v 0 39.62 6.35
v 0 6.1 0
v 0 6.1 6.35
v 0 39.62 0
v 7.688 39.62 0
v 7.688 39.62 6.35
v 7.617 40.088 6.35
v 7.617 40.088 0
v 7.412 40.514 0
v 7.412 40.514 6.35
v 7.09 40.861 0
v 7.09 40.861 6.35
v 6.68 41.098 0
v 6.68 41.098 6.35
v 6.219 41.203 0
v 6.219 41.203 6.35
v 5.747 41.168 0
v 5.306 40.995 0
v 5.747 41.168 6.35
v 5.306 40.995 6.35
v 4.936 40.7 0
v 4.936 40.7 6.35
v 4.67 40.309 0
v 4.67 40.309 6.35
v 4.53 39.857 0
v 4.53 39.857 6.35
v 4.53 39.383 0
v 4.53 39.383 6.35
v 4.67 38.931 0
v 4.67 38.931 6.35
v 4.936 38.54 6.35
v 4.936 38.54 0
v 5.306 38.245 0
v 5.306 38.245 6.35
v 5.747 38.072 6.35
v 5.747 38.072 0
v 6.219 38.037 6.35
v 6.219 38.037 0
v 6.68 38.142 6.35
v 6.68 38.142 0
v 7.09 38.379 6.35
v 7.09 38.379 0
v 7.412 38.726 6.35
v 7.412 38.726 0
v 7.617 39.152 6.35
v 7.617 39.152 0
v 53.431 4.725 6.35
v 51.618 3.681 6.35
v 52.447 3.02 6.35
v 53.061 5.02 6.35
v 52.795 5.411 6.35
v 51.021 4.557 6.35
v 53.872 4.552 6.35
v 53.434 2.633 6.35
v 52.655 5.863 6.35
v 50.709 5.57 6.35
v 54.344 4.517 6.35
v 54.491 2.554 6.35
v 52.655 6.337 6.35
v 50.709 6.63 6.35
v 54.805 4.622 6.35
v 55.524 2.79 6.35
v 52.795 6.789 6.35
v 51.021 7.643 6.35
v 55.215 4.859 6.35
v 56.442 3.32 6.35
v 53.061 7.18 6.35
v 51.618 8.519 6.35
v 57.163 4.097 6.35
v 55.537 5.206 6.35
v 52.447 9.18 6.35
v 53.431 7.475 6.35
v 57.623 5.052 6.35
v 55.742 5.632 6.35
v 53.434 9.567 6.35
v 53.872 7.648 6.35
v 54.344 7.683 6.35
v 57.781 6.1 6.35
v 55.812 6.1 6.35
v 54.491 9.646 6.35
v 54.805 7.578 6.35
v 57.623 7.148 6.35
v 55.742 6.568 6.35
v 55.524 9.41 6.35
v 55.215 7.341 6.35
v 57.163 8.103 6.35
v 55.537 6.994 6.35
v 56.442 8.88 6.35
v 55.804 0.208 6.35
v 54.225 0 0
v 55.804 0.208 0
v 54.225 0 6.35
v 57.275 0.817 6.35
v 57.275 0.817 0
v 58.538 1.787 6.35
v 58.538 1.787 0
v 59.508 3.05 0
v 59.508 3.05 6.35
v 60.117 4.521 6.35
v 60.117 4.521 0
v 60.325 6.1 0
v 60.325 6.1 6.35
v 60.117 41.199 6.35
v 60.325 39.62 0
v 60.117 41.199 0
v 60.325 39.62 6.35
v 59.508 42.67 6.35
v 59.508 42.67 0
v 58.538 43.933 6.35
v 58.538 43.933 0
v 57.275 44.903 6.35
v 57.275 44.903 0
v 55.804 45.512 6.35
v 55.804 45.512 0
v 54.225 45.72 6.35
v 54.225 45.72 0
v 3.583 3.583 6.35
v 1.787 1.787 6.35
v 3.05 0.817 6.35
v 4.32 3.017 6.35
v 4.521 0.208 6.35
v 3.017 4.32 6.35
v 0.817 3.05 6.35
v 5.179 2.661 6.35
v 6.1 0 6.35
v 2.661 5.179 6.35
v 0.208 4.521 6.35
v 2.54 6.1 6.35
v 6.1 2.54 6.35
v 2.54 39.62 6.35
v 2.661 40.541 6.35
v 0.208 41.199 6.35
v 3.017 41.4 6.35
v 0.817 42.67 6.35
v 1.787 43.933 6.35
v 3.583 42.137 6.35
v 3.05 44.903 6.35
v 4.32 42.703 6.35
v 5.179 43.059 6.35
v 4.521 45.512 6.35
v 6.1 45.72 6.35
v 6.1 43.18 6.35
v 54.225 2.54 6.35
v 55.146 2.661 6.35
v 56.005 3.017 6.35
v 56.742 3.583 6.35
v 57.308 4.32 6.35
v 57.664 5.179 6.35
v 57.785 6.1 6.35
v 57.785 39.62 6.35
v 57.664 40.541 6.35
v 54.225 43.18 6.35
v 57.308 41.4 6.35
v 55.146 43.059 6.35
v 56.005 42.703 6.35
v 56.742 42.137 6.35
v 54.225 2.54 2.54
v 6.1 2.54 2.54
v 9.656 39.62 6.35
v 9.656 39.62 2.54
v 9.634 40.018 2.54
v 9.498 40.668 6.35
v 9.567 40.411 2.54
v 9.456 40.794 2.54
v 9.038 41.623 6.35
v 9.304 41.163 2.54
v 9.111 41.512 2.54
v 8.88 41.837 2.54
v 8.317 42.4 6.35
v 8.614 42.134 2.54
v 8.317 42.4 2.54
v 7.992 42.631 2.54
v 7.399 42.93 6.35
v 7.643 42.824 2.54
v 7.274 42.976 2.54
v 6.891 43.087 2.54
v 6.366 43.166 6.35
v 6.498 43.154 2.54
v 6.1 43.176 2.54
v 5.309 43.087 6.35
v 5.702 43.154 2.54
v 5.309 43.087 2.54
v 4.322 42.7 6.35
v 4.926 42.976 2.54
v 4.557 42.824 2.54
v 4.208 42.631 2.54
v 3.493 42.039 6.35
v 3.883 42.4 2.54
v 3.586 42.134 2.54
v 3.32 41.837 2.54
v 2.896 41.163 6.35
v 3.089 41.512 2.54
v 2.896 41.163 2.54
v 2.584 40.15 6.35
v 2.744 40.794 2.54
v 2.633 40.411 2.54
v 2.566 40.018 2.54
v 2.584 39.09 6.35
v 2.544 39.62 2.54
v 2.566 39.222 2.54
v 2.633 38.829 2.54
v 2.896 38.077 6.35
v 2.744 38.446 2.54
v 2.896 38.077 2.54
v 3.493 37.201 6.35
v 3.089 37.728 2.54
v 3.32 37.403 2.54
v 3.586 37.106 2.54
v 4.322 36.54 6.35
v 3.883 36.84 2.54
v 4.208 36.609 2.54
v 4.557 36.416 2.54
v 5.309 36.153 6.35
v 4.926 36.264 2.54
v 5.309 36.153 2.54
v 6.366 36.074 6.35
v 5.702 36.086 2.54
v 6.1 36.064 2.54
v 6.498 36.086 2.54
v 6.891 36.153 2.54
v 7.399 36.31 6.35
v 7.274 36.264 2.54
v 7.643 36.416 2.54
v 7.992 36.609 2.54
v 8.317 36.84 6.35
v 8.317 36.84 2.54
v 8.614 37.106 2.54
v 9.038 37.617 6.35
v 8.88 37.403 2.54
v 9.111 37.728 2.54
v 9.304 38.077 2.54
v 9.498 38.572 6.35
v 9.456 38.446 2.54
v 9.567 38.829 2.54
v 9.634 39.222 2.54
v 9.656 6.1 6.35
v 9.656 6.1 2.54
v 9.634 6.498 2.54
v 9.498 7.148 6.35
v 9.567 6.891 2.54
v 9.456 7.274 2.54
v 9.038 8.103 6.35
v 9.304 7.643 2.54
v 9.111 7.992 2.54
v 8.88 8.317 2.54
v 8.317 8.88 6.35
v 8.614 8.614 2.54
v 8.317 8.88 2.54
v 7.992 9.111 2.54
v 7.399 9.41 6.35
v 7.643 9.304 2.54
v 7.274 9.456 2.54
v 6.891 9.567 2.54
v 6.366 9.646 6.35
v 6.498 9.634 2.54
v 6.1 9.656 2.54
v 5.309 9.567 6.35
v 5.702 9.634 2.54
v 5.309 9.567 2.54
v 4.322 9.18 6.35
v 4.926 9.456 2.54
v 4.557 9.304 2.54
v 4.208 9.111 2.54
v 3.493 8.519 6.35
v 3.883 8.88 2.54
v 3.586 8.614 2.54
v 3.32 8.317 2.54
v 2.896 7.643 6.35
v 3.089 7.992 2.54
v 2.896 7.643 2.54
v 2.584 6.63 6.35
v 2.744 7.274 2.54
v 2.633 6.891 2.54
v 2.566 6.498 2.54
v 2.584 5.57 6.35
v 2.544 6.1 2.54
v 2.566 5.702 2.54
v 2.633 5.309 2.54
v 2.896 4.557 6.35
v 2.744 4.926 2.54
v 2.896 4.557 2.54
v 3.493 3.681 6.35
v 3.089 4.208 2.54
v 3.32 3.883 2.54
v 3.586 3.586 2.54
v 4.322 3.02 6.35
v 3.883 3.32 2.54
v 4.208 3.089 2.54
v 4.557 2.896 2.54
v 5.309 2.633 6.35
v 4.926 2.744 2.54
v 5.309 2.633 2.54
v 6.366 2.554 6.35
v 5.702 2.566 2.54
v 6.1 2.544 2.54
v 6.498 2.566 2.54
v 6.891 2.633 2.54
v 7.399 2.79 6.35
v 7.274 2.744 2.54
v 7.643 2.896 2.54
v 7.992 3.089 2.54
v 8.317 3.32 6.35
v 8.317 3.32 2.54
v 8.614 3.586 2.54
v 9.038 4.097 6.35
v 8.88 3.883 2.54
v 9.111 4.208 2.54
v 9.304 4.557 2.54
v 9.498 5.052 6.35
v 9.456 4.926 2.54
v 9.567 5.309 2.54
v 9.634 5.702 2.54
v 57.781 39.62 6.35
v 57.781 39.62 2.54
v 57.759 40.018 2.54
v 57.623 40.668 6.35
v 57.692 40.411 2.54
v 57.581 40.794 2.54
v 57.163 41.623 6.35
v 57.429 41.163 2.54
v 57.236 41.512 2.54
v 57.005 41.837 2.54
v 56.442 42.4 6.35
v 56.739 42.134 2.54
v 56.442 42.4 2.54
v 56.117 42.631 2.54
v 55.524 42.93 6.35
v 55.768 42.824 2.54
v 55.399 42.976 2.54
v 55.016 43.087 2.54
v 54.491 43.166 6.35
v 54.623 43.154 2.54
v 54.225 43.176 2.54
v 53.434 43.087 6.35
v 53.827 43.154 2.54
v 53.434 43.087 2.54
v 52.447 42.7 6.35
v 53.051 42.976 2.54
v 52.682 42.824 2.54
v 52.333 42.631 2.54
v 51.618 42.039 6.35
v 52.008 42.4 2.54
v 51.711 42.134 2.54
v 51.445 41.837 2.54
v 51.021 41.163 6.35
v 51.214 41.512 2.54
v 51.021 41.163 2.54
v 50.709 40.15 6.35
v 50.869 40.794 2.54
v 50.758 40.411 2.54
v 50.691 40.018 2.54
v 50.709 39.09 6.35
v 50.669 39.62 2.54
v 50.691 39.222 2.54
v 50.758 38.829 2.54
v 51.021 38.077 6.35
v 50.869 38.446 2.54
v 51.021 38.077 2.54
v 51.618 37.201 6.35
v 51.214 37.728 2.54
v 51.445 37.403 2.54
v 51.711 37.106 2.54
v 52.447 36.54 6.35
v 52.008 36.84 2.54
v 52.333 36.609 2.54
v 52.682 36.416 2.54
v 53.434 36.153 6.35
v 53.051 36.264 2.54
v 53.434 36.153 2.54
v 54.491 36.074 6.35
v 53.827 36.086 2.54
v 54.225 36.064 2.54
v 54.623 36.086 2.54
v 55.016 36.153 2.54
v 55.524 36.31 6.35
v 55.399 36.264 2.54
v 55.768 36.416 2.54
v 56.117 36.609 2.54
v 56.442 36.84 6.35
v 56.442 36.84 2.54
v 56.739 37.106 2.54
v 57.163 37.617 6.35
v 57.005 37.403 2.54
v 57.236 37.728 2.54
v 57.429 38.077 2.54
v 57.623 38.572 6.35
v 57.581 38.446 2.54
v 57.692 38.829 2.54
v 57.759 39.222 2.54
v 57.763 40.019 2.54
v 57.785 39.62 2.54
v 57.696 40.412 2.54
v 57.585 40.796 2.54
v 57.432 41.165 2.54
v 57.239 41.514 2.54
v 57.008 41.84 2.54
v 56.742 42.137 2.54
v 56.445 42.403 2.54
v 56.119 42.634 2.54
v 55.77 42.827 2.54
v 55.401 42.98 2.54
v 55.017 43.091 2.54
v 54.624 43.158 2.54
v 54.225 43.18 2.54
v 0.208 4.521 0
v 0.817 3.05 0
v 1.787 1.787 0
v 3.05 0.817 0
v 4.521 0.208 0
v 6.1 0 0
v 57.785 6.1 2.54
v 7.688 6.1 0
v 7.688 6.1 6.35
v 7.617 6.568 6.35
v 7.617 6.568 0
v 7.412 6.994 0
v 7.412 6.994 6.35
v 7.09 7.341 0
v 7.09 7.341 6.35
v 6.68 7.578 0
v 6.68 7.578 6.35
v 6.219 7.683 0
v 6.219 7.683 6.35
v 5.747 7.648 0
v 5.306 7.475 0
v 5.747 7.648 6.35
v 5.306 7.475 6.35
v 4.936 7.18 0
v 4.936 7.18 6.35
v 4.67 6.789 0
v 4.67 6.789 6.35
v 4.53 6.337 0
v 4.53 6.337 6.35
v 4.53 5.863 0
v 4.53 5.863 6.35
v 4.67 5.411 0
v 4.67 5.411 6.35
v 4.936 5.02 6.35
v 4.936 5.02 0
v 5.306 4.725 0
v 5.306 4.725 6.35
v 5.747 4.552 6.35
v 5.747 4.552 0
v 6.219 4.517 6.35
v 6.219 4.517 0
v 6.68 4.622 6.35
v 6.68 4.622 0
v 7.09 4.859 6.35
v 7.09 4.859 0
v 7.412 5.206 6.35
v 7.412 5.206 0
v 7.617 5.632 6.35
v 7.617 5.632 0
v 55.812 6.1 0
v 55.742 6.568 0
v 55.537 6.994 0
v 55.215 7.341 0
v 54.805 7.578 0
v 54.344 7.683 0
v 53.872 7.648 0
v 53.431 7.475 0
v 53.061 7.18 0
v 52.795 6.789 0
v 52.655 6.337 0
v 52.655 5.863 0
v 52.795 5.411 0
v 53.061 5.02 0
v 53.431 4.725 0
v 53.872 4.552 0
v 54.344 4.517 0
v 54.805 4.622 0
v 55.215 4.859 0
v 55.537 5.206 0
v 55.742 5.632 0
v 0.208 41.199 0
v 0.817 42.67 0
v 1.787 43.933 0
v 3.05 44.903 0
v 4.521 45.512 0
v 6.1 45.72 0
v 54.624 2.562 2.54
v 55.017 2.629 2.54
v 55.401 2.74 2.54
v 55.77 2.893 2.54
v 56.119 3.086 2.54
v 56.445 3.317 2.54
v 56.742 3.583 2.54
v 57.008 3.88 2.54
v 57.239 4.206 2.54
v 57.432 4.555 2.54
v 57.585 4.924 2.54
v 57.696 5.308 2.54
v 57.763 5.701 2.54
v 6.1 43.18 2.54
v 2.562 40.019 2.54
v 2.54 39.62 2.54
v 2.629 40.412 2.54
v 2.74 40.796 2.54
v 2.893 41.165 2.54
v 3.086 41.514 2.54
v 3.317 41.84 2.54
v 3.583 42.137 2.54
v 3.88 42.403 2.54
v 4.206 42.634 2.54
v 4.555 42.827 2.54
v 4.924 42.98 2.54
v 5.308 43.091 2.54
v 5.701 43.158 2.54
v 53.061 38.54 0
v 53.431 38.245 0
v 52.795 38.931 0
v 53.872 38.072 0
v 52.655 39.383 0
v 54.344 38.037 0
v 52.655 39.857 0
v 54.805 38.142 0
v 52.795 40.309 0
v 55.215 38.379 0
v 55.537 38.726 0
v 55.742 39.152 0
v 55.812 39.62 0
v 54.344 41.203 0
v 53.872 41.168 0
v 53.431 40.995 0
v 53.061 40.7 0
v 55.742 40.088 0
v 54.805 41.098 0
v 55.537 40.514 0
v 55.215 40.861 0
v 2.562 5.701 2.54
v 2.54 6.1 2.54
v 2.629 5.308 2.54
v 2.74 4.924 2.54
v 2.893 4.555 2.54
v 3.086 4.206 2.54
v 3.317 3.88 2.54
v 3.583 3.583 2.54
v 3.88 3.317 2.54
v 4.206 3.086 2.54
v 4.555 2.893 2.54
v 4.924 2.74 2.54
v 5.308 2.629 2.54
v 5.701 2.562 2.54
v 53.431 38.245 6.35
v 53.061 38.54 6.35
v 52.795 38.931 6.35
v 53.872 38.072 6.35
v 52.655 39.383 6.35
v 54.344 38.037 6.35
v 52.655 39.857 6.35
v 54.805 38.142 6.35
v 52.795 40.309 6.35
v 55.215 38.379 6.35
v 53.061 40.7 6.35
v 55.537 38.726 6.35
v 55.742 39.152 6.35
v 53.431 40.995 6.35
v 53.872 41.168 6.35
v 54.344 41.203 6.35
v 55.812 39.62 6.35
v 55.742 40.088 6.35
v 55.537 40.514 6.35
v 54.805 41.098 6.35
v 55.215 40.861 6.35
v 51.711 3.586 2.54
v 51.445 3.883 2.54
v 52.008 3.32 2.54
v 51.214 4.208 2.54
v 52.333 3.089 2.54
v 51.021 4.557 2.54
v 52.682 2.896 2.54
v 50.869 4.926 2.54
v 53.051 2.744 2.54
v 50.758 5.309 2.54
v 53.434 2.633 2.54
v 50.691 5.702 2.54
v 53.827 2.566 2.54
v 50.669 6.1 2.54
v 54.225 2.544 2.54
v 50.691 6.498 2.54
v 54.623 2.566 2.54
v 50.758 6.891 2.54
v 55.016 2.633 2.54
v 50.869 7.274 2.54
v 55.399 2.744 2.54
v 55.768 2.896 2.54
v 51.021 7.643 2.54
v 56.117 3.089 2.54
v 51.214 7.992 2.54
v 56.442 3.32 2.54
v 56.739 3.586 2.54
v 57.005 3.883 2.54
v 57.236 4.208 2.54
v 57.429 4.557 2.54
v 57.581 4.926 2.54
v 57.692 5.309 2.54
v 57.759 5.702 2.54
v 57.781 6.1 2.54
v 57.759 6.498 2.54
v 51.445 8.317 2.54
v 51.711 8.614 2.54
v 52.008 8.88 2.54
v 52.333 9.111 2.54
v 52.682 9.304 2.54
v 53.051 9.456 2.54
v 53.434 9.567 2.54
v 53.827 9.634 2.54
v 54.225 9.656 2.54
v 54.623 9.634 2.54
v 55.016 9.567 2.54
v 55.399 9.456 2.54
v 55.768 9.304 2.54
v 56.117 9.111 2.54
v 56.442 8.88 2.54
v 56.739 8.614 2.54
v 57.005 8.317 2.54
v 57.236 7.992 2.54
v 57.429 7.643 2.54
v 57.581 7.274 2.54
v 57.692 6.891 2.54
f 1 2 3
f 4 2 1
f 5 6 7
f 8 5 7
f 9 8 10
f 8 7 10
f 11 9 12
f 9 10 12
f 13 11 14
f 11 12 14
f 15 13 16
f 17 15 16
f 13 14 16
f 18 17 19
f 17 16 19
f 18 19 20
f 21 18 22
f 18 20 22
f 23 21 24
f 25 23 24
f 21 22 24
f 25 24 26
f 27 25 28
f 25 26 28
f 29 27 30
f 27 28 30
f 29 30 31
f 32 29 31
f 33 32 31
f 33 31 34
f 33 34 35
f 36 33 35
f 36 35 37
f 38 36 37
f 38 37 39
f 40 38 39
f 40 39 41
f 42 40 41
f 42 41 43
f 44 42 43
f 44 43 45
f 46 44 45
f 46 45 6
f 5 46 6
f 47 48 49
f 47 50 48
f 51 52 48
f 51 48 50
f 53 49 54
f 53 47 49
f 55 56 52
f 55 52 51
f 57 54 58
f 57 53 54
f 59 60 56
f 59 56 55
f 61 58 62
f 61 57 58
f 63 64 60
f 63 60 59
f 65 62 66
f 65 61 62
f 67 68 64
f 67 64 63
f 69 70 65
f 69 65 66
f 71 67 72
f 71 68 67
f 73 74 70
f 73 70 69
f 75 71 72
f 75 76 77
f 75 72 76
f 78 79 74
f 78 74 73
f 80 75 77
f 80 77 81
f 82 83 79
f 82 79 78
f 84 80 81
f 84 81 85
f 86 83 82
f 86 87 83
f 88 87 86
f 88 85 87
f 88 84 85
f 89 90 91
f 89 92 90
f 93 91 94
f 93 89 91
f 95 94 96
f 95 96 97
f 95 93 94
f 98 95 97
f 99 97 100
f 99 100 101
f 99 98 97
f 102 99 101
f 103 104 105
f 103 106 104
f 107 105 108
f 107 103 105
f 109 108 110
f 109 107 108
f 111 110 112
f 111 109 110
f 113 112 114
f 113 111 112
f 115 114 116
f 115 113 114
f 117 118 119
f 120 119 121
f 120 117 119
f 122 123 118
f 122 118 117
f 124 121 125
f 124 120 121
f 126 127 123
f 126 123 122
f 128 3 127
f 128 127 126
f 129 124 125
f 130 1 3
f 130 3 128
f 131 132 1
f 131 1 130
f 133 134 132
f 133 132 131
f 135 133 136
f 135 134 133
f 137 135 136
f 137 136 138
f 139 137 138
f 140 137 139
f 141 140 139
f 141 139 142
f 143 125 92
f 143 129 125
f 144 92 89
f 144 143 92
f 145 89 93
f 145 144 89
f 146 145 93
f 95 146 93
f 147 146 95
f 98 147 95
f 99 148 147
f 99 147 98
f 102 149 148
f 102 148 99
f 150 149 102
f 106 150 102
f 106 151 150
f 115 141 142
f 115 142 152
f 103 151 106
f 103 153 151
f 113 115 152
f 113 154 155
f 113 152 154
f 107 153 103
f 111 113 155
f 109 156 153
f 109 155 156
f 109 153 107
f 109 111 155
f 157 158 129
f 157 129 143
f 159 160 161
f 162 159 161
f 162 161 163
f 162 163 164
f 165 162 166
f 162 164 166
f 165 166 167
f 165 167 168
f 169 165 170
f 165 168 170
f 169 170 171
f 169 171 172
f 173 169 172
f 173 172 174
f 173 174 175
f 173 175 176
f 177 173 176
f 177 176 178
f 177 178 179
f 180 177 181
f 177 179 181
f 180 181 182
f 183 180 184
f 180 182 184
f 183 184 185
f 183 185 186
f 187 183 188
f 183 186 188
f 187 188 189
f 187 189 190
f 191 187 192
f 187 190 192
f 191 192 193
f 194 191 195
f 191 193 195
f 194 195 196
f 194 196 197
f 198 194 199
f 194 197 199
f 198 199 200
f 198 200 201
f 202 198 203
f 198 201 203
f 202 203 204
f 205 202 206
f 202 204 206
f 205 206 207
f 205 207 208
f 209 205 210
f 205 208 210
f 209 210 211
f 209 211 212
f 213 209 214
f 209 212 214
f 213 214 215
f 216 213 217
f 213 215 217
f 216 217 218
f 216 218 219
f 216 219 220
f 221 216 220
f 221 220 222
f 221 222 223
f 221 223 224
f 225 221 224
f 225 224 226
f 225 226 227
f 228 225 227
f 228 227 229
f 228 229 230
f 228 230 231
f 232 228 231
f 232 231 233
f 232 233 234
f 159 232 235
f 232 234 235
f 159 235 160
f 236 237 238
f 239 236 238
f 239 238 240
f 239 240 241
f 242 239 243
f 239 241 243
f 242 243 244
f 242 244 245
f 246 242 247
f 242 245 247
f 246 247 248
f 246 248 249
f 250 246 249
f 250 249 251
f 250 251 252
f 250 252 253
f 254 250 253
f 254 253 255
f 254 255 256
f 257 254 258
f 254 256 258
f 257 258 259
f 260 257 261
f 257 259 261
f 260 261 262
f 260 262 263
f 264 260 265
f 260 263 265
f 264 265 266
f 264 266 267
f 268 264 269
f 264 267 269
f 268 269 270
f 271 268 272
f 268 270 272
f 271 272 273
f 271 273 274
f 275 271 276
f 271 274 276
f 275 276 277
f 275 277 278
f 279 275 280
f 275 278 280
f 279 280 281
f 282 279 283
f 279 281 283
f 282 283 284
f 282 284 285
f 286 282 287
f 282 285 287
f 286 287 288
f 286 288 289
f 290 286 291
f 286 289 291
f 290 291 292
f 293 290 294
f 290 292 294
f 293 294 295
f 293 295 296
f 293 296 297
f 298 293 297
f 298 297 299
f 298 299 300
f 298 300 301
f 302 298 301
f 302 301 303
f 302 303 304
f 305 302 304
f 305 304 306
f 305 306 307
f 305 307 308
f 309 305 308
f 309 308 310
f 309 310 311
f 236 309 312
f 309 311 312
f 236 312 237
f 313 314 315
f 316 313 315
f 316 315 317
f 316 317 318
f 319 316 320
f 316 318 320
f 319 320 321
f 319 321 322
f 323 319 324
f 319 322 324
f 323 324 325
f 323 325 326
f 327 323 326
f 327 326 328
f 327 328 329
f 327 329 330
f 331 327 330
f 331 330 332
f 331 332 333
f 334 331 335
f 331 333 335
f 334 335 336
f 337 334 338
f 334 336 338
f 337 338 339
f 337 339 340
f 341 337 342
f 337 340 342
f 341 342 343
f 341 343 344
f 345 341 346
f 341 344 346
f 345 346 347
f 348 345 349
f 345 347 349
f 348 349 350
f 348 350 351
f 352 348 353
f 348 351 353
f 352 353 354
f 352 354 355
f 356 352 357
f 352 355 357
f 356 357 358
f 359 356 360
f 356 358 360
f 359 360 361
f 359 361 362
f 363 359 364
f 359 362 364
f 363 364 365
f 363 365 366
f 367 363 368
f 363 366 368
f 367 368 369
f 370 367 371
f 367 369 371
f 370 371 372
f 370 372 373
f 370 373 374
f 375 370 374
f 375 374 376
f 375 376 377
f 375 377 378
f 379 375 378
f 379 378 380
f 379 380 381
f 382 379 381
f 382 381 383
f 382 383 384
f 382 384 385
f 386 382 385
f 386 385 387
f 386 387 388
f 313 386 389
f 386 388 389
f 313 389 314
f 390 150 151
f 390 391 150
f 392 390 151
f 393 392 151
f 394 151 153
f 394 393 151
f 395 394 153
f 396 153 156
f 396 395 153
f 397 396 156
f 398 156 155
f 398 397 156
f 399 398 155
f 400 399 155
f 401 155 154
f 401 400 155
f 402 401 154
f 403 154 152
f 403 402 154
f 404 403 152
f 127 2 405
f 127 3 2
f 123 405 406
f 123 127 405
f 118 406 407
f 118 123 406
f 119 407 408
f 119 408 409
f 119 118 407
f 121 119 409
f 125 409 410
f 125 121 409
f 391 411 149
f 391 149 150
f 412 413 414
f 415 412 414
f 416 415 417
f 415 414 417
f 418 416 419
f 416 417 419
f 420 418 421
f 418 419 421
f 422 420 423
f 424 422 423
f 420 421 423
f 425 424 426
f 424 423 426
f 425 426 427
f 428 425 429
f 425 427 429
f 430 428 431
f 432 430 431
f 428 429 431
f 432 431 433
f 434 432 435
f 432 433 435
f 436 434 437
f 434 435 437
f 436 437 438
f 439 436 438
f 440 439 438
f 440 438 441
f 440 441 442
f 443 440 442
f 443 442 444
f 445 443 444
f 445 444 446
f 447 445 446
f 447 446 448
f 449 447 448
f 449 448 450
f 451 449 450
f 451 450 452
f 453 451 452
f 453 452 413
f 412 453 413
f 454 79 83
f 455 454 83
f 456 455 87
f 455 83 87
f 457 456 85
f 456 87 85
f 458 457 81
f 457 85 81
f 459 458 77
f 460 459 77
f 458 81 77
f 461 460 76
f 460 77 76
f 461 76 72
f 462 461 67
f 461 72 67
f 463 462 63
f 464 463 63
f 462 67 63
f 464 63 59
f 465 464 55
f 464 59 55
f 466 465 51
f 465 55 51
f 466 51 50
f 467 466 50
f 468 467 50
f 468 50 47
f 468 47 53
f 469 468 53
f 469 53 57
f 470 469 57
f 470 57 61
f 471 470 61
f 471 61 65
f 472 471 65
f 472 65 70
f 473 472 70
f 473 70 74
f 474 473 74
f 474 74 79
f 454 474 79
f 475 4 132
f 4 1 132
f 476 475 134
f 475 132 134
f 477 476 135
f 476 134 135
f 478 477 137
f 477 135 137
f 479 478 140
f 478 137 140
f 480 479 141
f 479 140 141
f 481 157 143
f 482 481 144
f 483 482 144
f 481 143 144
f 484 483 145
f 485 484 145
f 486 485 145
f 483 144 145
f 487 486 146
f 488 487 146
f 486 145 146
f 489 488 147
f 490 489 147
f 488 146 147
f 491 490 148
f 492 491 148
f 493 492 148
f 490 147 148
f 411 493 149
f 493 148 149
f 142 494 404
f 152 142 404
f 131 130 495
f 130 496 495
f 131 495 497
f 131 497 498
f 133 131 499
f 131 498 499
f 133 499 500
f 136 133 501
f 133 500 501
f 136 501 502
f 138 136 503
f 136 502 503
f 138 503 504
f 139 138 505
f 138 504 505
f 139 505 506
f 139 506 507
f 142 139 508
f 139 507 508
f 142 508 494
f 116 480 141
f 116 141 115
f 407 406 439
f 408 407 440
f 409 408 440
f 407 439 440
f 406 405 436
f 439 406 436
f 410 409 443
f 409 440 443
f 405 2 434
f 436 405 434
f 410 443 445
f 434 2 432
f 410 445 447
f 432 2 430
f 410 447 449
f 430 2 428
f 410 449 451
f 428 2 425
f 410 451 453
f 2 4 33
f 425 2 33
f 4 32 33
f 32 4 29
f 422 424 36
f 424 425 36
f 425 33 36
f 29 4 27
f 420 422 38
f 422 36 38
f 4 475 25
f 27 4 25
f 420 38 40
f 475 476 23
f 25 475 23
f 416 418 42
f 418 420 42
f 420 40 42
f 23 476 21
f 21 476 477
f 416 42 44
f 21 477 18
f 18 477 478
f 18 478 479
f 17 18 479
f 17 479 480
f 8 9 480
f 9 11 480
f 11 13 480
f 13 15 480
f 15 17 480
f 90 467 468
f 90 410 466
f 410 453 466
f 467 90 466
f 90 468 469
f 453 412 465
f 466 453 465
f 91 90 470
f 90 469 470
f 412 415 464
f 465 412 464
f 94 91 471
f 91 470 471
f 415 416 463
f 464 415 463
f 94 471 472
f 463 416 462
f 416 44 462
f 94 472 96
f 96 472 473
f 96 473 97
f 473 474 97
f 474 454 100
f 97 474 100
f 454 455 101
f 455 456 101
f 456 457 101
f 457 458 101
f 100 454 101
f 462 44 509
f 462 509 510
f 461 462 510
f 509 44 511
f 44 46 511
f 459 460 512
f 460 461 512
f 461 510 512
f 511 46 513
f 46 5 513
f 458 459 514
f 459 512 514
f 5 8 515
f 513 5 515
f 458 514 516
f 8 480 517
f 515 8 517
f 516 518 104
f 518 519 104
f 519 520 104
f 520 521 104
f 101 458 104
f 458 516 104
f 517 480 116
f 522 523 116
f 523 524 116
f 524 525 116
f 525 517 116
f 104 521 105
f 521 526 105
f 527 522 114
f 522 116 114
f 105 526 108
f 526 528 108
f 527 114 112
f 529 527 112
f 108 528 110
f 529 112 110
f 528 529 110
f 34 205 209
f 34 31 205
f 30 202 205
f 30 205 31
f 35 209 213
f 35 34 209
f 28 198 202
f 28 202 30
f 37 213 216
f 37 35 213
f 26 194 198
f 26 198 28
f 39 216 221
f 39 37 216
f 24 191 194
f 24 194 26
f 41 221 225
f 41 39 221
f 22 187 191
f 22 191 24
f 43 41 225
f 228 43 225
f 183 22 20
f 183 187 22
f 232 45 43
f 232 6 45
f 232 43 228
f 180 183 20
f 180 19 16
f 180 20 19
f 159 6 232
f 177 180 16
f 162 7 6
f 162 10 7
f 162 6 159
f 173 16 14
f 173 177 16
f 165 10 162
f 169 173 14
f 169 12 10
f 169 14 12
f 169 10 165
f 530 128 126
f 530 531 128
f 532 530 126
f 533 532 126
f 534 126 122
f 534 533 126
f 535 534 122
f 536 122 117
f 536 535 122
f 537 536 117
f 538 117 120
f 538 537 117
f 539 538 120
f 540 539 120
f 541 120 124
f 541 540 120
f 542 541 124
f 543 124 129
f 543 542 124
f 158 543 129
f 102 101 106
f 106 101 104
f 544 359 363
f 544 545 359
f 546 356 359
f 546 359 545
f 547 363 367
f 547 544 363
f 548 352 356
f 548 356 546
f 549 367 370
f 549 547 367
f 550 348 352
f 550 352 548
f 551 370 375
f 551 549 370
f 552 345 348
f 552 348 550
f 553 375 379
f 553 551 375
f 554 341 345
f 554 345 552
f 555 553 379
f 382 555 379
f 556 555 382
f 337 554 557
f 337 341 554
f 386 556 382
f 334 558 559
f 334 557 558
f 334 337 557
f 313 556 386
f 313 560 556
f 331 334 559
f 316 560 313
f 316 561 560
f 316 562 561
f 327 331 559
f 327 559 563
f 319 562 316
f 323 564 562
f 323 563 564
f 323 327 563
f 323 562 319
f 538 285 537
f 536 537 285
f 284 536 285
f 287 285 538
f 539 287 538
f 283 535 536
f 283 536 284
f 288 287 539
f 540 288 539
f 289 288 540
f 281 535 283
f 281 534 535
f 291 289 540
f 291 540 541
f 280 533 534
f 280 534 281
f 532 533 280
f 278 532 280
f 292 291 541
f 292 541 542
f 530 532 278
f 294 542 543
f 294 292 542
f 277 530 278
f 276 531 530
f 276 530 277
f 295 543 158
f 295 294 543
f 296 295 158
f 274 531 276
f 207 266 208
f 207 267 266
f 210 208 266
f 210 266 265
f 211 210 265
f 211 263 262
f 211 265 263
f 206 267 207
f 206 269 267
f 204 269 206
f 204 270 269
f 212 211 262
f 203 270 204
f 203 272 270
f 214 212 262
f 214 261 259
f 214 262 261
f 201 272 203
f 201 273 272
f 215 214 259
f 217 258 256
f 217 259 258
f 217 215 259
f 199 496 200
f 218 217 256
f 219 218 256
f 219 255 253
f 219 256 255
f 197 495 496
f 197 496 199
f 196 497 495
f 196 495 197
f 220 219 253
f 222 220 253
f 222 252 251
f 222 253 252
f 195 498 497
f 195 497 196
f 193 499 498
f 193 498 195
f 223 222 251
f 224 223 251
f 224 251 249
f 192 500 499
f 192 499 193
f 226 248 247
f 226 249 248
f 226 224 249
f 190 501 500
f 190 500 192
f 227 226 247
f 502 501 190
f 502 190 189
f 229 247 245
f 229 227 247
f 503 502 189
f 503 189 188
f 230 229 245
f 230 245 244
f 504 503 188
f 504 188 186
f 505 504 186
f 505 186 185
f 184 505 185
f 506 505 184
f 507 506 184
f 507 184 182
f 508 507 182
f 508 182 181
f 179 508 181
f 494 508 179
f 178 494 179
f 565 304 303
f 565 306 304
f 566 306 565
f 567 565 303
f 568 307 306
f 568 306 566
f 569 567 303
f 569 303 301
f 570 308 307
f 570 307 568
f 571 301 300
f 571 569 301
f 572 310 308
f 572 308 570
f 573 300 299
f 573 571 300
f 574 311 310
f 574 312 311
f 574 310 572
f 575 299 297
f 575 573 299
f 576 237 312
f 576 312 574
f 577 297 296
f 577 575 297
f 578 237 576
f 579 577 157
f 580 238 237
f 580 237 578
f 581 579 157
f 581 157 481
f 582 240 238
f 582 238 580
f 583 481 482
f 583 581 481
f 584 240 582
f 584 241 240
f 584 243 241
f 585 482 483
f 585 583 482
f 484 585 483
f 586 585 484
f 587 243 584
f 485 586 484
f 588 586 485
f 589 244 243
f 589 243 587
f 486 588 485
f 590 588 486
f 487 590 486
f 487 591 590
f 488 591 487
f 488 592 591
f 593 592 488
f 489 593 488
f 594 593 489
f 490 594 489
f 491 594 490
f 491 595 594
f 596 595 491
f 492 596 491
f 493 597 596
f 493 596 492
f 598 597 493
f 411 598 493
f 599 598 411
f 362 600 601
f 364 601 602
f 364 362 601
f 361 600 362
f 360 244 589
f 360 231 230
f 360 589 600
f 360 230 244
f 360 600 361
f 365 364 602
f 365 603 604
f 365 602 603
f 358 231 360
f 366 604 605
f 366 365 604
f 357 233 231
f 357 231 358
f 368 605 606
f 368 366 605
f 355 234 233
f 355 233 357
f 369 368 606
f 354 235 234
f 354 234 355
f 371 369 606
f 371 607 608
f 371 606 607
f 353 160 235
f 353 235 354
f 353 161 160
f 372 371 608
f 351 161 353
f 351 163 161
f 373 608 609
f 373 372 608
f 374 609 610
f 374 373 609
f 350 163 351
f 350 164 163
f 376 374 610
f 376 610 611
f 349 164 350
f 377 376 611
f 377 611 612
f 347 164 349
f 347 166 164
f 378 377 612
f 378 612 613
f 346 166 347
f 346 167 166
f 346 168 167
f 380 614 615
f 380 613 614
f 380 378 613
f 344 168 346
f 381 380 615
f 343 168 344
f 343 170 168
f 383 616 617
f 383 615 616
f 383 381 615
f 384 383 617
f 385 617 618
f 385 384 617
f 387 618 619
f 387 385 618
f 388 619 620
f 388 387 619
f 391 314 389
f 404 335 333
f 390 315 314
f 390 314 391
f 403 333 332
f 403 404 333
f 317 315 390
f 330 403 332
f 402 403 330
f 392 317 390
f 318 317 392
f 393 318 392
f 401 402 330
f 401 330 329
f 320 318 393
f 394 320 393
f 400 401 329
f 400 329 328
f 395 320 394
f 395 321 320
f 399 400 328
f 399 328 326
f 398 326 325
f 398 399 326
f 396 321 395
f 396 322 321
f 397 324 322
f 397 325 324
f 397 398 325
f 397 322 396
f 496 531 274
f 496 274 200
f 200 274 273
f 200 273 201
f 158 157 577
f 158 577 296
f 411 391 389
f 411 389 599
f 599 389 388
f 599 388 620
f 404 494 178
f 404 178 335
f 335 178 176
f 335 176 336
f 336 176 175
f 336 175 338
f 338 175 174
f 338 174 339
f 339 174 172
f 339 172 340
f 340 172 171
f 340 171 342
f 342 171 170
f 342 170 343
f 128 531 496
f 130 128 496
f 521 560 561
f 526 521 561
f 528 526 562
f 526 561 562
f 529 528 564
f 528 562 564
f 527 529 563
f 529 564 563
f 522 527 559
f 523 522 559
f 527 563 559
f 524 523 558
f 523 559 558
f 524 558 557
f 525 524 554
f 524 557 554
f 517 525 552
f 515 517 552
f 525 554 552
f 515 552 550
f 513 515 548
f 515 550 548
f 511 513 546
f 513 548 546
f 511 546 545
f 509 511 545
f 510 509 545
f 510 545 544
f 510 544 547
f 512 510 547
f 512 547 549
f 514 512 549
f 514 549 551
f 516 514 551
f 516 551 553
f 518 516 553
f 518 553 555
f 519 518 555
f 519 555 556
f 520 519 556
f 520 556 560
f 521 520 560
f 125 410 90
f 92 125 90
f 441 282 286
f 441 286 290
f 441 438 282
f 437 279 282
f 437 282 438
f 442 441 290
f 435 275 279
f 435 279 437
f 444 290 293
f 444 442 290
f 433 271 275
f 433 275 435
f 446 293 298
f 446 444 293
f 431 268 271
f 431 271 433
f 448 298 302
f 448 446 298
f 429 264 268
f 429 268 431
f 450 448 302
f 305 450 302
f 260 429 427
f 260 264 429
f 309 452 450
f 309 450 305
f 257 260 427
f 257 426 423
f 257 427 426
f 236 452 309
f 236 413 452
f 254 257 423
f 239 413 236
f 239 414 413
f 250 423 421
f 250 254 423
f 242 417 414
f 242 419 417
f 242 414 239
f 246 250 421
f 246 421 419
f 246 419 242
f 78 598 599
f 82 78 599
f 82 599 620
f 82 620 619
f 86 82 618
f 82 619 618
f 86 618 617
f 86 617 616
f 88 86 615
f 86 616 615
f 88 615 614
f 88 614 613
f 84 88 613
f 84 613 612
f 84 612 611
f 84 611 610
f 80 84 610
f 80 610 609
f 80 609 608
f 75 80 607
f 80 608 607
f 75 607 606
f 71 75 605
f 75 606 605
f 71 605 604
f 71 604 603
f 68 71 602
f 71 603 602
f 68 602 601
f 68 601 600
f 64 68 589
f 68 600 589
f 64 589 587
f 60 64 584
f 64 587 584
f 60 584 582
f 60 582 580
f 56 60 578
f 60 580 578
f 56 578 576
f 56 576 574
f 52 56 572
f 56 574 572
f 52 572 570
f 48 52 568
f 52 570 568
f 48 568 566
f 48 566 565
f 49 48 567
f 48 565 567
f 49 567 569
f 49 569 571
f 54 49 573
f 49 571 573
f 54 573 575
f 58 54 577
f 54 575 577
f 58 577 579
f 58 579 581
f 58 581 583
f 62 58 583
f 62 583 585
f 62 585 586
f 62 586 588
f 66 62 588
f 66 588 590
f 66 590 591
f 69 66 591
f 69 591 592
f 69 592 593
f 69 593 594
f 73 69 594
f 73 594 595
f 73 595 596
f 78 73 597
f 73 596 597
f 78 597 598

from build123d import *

# Parameters (mm, degrees)
SKETCH001_R      = 1.5875
EXTRUDE001_DEPTH = 7.62
SKETCH_R         = 3.556
EXTRUDE_DEPTH    = 3.81
BOX_W            = 60.325
BOX_H            = 45.72
BOX_DEPTH        = 6.35
THICKNESS_T      = -2.54
FILLET_R         = 3.56
FILLET001_R      = 6.1


with BuildPart() as extrude001:
    # Sketch001 (on Face9 of Extrude) → Extrude001 (new body)
    with BuildSketch(Plane.XY.offset(6.35)):
        with Locations((6.1, 39.62)):
            Circle(SKETCH001_R)
        with Locations((54.225, 39.62)):
            Circle(SKETCH001_R)
        with Locations((54.225, 6.1)):
            Circle(SKETCH001_R)
        with Locations((6.1, 6.1)):
            Circle(SKETCH001_R)
    extrude(amount=-EXTRUDE001_DEPTH)


with BuildPart() as extrude_body:
    # Sketch (on Face19 of Fillet001) → Extrude (new body)
    with BuildSketch(Plane.XY.offset(2.54)):
        with Locations((6.1, 39.62)):
            Circle(SKETCH_R)
        with Locations((54.225, 39.62)):
            Circle(SKETCH_R)
        with Locations((54.225, 6.1)):
            Circle(SKETCH_R)
        with Locations((6.1, 6.1)):
            Circle(SKETCH_R)
    extrude(amount=EXTRUDE_DEPTH)


with BuildPart() as cut:
    # Box → Box (new body)
    with BuildSketch(Plane.XY):
        with Locations((30.1625, 22.86)):
            Rectangle(BOX_W, BOX_H)
    extrude(amount=BOX_DEPTH)

    # Thickness
    thickness_openings = [cut.faces().sort_by_distance(p)[0] for p in [
        (30.1625, 22.86, 6.35),
    ]]
    offset(amount=THICKNESS_T, openings=thickness_openings, kind=Kind.INTERSECTION)

    # Fillet
    fillet_edges = [cut.edges().sort_by_distance(p)[0] for p in [
        (2.54, 2.54, 4.445),
        (2.54, 43.18, 4.445),
        (57.785, 2.54, 4.445),
        (57.785, 43.18, 4.445),
    ]]
    fillet(fillet_edges, radius=FILLET_R)

    # Fillet001
    fillet001_edges = [cut.edges().sort_by_distance(p)[0] for p in [
        (0, 0, 3.175),
        (0, 45.72, 3.175),
        (60.325, 0, 3.175),
        (60.325, 45.72, 3.175),
    ]]
    fillet(fillet001_edges, radius=FILLET001_R)

    # Fusion: union Extrude body
    add(extrude_body.part)

    # Cut: cut Extrude001
    add(extrude001.part, mode=Mode.SUBTRACT)


solid = cut.part
